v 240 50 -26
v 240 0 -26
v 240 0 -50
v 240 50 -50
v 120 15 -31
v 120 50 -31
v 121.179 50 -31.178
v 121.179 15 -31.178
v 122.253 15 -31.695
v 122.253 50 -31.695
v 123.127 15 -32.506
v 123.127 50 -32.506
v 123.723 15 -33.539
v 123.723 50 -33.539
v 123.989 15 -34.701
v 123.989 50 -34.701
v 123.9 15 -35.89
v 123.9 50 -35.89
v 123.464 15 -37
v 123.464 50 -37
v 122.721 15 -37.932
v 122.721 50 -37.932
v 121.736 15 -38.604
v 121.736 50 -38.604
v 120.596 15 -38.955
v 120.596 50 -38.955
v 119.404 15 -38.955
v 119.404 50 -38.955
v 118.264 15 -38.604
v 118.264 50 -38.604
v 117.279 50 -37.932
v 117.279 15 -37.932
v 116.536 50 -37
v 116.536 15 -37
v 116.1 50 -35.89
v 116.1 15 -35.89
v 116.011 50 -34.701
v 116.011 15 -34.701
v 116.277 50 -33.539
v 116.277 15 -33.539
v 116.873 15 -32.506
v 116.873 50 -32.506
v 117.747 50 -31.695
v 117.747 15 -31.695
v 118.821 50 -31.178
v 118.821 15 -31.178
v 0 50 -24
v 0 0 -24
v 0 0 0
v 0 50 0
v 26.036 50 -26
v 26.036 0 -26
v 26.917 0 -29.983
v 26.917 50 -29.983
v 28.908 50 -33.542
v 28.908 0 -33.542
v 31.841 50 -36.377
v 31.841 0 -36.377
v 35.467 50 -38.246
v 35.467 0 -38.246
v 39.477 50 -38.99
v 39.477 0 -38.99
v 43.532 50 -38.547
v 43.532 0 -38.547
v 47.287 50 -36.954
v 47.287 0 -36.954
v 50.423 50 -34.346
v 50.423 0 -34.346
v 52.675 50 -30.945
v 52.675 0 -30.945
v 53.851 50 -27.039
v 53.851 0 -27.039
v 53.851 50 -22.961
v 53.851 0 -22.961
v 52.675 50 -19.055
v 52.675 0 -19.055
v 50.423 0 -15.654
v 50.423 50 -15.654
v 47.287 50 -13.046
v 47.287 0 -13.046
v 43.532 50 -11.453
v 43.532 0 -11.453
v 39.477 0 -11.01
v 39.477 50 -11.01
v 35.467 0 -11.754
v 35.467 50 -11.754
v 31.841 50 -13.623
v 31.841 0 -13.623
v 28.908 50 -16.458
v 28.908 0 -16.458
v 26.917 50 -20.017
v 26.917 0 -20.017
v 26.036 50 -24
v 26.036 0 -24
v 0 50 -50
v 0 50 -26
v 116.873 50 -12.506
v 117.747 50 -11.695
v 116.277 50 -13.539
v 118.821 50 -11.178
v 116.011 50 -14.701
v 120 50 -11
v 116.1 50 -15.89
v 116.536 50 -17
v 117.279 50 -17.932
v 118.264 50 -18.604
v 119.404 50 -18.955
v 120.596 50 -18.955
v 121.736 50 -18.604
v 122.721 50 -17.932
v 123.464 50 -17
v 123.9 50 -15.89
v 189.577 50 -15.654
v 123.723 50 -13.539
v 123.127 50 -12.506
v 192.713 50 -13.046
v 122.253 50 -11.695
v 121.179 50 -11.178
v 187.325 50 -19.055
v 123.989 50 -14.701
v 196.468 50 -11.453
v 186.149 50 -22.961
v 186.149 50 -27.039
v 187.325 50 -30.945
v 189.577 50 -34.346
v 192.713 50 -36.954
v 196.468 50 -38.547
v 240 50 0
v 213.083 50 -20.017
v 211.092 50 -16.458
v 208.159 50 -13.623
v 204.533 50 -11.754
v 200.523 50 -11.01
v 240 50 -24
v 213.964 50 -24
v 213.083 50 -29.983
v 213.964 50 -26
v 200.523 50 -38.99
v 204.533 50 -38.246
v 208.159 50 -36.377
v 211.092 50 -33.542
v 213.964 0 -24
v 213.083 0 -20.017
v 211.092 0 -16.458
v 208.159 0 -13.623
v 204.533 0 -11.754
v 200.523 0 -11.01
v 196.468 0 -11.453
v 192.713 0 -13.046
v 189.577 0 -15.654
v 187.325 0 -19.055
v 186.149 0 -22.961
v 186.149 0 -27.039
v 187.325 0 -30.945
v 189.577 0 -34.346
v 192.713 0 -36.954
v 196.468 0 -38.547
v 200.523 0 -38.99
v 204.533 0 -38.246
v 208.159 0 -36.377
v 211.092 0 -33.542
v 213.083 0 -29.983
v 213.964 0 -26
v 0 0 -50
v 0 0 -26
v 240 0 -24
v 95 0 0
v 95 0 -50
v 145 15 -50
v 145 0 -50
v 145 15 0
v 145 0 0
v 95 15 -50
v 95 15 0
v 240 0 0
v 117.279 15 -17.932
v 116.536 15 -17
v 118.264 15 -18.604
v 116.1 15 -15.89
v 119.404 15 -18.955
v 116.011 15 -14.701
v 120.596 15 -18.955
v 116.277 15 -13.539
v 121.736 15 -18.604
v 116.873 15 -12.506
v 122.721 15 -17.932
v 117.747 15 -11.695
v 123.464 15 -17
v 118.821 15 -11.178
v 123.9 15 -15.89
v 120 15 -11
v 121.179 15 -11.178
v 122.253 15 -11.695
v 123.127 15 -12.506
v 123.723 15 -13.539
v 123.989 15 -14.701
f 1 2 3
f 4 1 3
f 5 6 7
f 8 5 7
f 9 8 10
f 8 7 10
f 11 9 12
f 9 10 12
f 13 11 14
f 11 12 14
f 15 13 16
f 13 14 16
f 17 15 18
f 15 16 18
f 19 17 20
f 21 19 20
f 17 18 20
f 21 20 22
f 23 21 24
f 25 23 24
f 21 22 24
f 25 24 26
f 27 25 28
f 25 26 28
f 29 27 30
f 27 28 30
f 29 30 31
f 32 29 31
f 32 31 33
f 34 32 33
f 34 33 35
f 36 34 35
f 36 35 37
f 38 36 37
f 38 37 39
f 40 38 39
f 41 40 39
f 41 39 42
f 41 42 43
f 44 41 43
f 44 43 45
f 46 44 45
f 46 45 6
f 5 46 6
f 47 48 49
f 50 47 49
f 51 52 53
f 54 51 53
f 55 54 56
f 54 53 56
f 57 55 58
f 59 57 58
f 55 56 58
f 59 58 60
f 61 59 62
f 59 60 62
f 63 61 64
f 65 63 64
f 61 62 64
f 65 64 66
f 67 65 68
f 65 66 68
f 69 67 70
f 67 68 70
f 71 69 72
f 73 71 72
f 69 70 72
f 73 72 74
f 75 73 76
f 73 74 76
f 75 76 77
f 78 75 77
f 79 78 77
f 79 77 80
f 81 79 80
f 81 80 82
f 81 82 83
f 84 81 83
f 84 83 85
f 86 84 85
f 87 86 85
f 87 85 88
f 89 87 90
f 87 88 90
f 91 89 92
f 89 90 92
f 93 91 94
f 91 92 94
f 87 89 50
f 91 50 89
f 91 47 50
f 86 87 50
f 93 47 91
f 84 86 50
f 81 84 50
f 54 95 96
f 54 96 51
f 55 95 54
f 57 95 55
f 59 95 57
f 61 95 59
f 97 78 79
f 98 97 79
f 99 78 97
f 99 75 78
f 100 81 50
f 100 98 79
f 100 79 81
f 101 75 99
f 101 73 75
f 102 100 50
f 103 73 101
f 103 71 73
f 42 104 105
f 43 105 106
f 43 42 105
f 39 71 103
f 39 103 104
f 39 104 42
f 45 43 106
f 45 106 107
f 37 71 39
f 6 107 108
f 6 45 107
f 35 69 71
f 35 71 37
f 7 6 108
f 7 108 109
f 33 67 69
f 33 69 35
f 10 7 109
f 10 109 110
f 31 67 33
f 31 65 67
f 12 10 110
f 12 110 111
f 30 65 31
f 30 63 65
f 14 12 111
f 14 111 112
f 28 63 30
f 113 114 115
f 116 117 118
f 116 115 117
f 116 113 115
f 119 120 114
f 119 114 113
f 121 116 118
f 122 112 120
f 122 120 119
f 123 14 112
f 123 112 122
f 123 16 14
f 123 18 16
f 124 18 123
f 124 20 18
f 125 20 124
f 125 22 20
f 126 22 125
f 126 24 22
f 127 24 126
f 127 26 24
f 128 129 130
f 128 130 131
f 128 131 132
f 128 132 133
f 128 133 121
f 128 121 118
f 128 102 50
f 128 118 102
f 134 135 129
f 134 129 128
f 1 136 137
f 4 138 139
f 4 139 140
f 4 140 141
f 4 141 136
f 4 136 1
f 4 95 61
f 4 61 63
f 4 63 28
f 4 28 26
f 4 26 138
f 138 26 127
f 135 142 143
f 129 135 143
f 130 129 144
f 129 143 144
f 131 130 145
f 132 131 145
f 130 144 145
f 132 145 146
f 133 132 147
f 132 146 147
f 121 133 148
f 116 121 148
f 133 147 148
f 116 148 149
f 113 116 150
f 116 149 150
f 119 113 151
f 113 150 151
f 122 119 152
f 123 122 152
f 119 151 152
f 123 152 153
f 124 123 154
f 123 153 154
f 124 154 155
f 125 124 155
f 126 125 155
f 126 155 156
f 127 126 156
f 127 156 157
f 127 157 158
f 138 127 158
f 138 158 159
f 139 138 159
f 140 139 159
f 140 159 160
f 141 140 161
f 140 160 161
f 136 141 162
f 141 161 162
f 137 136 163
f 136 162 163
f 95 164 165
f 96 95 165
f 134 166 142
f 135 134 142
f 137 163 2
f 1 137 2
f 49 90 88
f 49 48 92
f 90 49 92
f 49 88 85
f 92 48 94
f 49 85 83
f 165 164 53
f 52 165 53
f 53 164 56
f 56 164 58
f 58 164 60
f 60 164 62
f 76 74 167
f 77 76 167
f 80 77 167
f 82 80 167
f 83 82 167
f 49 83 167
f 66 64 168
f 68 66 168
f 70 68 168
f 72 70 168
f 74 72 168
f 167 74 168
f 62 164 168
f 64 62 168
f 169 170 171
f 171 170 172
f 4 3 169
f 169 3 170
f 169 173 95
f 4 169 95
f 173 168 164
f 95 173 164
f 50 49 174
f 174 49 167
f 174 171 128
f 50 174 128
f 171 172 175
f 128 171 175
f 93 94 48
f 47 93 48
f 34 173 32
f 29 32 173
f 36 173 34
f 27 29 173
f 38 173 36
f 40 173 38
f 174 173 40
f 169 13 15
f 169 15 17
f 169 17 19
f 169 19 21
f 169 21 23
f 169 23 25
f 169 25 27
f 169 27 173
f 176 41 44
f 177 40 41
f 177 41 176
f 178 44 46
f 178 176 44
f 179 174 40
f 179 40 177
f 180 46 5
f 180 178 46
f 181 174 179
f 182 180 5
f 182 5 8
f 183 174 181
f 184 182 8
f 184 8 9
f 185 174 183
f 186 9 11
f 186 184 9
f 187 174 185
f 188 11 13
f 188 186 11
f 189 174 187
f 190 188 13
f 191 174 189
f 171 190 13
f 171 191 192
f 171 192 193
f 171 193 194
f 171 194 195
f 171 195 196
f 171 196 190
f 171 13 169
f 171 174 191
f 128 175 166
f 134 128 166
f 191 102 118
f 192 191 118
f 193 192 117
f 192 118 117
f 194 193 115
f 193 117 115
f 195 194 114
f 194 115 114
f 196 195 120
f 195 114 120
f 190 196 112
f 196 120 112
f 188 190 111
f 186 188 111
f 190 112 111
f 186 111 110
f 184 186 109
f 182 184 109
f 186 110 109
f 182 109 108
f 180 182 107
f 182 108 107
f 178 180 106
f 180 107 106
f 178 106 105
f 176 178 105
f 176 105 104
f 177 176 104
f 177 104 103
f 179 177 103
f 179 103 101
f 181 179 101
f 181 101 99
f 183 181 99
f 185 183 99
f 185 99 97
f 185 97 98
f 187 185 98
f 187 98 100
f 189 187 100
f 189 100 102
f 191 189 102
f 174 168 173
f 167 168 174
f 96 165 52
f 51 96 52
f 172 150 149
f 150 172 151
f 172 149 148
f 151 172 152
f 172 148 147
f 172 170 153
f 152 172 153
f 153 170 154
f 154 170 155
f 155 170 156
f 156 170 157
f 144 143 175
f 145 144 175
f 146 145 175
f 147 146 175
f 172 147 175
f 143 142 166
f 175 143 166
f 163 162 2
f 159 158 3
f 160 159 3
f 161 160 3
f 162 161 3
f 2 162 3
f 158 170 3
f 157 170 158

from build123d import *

# Parameters (mm, degrees)
EXTRUDE_1_DEPTH     = 50
SKETCH_3_W          = 50
SKETCH_3_H          = 50
CUT_EXTRUDE_1_DEPTH = 15
SKETCH_4_R          = 4
CUT_EXTRUDE_2_DEPTH = 50


with BuildPart() as part:
    # Эскиз1 → Бобышка-Вытянуть1 (new body)
    with BuildSketch(Plane(origin=(0, 0, 0), x_dir=(1, 0, 0), z_dir=(0, 1, 0))):
        with BuildLine():
            Line((0, 0), (240, 0))
            Line((240, 0), (240, 24))
            Line((240, 24), (213.964240044, 24))
            ThreePointArc((213.964240044, 24), (186, 25), (213.964240044, 26))
            Line((213.964240044, 26), (240, 26))
            Line((240, 26), (240, 50))
            Line((240, 50), (0, 50))
            Line((0, 50), (0, 26))
            Line((0, 26), (26.035759956, 26))
            ThreePointArc((26.035759956, 26), (54, 25), (26.035759956, 24))
            Line((26.035759956, 24), (0, 24))
            Line((0, 24), (0, 0))
        make_face()
    extrude(amount=EXTRUDE_1_DEPTH)

    # Эскиз3 → Вырез-Вытянуть1 (cut)
    with BuildSketch(Plane.XZ):
        with Locations((120, -25)):
            Rectangle(SKETCH_3_W, SKETCH_3_H)
    extrude(amount=-CUT_EXTRUDE_1_DEPTH, mode=Mode.SUBTRACT)

    # Эскиз4 → Вырез-Вытянуть2 (cut)
    with BuildSketch(Plane(origin=(0, 50, 0), x_dir=(1, 0, 0), z_dir=(0, 1, 0))):
        with Locations(Location((120, 35, 0), (0, 0, 270))):
            Circle(SKETCH_4_R)
        with Locations(Location((120, 15, 0), (0, 0, 270))):
            Circle(SKETCH_4_R)
    extrude(amount=-CUT_EXTRUDE_2_DEPTH, mode=Mode.SUBTRACT)


solid = part.part
